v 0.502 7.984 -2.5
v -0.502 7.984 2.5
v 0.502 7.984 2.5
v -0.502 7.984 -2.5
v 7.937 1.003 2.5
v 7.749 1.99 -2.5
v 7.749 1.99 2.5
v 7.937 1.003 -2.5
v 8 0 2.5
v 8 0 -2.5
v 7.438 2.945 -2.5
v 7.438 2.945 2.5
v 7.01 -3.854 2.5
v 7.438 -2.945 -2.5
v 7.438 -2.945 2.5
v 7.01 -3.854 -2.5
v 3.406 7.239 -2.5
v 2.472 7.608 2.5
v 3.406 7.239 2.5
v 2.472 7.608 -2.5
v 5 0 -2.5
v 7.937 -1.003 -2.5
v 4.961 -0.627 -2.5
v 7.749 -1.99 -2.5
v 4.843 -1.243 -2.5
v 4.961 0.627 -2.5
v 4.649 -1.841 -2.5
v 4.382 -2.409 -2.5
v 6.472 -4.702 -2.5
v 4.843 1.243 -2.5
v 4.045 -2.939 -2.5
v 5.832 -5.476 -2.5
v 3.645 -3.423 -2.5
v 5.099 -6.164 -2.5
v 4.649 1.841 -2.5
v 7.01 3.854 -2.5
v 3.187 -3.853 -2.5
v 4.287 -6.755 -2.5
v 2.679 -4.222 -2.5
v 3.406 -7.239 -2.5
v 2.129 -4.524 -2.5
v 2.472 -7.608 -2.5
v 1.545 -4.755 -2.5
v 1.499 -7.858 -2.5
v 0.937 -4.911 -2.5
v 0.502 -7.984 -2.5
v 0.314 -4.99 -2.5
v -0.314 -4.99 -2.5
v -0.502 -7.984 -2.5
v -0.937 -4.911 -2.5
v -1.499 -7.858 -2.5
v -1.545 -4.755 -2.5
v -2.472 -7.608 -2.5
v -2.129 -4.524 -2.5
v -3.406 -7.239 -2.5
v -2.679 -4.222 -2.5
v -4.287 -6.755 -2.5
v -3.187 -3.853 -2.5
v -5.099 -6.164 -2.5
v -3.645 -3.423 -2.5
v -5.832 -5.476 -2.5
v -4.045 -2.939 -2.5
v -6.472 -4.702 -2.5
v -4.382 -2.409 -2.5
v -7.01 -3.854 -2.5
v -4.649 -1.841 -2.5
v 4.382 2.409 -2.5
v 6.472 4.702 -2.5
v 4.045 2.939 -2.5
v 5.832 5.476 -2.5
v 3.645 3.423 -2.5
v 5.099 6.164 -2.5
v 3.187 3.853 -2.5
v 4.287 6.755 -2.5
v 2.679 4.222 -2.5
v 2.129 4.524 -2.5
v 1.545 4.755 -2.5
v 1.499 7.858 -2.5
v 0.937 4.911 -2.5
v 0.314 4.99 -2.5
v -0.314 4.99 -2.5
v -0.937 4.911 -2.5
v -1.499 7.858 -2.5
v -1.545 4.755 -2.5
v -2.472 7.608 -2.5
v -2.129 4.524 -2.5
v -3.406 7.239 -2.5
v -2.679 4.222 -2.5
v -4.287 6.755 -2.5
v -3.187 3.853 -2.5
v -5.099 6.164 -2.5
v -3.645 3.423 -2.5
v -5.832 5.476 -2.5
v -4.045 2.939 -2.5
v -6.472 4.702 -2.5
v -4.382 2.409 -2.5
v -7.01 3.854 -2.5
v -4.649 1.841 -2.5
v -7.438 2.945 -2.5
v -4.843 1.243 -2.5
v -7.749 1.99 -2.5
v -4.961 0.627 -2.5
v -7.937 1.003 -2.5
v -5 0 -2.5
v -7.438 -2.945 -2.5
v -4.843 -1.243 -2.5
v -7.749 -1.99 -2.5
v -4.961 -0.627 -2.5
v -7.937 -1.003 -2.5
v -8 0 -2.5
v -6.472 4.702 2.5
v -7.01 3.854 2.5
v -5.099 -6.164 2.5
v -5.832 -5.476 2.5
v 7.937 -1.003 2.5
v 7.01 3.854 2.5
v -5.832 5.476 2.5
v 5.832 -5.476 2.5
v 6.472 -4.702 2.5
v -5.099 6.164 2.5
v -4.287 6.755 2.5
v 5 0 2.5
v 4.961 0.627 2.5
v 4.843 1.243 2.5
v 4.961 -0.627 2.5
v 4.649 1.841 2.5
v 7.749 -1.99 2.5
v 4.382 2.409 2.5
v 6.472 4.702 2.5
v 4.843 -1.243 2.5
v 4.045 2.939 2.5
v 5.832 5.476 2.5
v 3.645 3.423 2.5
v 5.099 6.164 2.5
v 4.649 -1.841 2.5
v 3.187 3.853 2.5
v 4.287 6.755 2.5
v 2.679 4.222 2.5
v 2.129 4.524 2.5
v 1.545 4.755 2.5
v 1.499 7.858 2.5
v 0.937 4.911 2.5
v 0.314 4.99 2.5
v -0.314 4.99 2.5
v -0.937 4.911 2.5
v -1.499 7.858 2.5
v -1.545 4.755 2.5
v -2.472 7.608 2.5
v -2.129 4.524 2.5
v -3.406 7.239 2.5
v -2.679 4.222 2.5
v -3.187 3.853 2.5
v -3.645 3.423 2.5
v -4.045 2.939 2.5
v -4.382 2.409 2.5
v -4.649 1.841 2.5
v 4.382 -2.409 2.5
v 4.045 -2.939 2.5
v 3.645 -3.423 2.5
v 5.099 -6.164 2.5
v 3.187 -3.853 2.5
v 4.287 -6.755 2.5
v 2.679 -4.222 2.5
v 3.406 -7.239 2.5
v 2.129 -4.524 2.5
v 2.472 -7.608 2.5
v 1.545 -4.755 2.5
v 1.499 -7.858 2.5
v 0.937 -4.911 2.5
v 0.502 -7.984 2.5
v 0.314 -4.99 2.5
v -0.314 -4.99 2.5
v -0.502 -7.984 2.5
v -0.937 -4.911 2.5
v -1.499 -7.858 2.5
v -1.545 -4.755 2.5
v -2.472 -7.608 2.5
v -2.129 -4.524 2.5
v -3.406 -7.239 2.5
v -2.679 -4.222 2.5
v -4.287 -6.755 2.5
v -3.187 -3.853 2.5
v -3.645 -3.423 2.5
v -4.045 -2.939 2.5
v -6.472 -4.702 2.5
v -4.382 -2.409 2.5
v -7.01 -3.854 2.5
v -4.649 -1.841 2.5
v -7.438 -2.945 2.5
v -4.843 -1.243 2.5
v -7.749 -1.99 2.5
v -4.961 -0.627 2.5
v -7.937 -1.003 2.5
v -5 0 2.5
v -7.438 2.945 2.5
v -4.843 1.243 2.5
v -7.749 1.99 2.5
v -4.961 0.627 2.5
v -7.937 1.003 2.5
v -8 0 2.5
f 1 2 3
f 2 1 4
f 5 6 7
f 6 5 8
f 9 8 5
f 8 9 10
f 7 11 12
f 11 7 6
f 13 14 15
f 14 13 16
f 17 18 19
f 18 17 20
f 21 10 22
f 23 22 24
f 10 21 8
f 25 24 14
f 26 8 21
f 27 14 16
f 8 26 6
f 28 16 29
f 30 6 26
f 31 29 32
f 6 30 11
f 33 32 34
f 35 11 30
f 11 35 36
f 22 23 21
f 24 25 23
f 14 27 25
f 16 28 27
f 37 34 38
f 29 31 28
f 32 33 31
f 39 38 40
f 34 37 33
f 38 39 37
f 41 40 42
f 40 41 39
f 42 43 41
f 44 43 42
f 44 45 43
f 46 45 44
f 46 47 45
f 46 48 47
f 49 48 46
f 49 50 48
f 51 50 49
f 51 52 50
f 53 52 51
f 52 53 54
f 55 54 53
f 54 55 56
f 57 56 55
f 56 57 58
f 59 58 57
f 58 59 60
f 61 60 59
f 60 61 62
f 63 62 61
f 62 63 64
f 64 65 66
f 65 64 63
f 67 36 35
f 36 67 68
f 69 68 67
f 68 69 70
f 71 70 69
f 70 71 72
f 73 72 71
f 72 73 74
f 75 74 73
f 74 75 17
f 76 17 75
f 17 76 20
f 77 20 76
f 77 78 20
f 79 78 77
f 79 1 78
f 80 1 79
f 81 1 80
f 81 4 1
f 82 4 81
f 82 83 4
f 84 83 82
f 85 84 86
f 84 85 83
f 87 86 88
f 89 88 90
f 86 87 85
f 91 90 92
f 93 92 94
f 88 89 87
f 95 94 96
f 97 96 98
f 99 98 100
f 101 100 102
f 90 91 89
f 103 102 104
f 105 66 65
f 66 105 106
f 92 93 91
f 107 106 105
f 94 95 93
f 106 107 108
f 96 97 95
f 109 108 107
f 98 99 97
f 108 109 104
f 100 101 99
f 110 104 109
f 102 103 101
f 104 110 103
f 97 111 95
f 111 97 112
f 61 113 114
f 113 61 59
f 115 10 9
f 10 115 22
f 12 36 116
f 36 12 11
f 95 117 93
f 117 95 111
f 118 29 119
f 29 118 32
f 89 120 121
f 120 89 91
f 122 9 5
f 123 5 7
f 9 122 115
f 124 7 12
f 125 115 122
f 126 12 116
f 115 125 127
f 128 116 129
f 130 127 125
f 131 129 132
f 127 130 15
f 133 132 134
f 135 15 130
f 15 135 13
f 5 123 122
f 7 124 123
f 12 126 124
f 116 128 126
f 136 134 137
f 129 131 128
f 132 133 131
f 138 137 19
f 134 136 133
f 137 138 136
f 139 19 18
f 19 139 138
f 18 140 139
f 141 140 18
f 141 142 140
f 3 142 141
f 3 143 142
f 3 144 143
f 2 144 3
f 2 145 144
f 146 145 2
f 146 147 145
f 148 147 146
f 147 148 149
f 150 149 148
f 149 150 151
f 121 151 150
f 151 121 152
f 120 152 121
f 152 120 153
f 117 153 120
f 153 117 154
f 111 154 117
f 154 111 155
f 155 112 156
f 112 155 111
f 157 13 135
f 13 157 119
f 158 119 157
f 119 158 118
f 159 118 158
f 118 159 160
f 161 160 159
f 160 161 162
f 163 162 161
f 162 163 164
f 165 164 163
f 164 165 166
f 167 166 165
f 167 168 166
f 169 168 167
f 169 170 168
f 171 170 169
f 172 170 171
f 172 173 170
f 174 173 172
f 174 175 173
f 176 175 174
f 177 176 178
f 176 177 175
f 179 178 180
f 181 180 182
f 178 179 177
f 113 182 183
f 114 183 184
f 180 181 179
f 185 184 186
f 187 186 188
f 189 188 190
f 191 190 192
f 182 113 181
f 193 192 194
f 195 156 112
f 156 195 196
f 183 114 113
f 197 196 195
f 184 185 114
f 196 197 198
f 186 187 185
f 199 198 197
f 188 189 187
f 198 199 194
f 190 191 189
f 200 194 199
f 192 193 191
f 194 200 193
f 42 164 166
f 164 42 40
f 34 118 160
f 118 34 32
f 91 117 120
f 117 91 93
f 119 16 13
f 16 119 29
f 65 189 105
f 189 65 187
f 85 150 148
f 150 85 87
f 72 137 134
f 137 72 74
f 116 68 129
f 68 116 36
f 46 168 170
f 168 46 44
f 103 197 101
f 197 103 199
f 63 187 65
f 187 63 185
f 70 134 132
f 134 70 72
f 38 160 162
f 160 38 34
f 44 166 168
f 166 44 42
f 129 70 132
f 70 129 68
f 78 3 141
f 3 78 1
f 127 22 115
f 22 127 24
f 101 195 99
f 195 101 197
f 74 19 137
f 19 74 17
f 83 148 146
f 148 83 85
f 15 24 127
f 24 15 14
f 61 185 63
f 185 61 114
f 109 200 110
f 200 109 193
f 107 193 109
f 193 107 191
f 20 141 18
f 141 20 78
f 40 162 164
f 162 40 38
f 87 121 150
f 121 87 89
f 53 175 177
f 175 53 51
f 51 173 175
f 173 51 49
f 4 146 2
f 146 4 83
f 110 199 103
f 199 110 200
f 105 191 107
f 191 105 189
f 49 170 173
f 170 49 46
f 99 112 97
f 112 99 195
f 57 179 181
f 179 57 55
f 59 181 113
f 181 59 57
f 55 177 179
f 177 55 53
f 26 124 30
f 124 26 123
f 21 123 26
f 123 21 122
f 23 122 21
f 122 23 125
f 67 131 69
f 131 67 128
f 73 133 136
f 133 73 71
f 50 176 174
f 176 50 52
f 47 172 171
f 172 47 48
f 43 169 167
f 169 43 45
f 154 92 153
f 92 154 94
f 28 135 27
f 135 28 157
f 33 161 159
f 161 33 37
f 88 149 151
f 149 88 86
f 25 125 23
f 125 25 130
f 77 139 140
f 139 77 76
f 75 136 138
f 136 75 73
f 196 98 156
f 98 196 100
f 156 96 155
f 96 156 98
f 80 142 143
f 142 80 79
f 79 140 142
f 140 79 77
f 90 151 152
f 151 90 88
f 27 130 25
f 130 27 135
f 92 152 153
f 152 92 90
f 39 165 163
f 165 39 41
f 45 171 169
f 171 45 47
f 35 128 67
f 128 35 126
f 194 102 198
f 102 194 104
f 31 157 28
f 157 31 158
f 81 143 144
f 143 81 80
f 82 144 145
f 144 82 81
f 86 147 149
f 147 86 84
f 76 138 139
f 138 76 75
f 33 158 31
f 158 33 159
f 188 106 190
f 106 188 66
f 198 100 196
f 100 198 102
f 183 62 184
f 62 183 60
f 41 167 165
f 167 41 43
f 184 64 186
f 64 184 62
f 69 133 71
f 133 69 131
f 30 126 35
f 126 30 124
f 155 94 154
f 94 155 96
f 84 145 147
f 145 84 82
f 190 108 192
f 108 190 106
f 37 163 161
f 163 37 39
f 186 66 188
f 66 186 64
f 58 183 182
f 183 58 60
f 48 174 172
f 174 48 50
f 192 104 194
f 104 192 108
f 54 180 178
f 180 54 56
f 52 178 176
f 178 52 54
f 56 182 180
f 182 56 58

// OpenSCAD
$fn = 50;


difference() {
	union() {
		translate(v = [0, 0, -2.5000000000]) {
			cylinder(h = 5, r = 8.0000000000);
		}
	}
	union() {
		translate(v = [0, 0, -100.0000000000]) {
			cylinder(h = 200, r = 5.0000000000);
		}
	}
}
